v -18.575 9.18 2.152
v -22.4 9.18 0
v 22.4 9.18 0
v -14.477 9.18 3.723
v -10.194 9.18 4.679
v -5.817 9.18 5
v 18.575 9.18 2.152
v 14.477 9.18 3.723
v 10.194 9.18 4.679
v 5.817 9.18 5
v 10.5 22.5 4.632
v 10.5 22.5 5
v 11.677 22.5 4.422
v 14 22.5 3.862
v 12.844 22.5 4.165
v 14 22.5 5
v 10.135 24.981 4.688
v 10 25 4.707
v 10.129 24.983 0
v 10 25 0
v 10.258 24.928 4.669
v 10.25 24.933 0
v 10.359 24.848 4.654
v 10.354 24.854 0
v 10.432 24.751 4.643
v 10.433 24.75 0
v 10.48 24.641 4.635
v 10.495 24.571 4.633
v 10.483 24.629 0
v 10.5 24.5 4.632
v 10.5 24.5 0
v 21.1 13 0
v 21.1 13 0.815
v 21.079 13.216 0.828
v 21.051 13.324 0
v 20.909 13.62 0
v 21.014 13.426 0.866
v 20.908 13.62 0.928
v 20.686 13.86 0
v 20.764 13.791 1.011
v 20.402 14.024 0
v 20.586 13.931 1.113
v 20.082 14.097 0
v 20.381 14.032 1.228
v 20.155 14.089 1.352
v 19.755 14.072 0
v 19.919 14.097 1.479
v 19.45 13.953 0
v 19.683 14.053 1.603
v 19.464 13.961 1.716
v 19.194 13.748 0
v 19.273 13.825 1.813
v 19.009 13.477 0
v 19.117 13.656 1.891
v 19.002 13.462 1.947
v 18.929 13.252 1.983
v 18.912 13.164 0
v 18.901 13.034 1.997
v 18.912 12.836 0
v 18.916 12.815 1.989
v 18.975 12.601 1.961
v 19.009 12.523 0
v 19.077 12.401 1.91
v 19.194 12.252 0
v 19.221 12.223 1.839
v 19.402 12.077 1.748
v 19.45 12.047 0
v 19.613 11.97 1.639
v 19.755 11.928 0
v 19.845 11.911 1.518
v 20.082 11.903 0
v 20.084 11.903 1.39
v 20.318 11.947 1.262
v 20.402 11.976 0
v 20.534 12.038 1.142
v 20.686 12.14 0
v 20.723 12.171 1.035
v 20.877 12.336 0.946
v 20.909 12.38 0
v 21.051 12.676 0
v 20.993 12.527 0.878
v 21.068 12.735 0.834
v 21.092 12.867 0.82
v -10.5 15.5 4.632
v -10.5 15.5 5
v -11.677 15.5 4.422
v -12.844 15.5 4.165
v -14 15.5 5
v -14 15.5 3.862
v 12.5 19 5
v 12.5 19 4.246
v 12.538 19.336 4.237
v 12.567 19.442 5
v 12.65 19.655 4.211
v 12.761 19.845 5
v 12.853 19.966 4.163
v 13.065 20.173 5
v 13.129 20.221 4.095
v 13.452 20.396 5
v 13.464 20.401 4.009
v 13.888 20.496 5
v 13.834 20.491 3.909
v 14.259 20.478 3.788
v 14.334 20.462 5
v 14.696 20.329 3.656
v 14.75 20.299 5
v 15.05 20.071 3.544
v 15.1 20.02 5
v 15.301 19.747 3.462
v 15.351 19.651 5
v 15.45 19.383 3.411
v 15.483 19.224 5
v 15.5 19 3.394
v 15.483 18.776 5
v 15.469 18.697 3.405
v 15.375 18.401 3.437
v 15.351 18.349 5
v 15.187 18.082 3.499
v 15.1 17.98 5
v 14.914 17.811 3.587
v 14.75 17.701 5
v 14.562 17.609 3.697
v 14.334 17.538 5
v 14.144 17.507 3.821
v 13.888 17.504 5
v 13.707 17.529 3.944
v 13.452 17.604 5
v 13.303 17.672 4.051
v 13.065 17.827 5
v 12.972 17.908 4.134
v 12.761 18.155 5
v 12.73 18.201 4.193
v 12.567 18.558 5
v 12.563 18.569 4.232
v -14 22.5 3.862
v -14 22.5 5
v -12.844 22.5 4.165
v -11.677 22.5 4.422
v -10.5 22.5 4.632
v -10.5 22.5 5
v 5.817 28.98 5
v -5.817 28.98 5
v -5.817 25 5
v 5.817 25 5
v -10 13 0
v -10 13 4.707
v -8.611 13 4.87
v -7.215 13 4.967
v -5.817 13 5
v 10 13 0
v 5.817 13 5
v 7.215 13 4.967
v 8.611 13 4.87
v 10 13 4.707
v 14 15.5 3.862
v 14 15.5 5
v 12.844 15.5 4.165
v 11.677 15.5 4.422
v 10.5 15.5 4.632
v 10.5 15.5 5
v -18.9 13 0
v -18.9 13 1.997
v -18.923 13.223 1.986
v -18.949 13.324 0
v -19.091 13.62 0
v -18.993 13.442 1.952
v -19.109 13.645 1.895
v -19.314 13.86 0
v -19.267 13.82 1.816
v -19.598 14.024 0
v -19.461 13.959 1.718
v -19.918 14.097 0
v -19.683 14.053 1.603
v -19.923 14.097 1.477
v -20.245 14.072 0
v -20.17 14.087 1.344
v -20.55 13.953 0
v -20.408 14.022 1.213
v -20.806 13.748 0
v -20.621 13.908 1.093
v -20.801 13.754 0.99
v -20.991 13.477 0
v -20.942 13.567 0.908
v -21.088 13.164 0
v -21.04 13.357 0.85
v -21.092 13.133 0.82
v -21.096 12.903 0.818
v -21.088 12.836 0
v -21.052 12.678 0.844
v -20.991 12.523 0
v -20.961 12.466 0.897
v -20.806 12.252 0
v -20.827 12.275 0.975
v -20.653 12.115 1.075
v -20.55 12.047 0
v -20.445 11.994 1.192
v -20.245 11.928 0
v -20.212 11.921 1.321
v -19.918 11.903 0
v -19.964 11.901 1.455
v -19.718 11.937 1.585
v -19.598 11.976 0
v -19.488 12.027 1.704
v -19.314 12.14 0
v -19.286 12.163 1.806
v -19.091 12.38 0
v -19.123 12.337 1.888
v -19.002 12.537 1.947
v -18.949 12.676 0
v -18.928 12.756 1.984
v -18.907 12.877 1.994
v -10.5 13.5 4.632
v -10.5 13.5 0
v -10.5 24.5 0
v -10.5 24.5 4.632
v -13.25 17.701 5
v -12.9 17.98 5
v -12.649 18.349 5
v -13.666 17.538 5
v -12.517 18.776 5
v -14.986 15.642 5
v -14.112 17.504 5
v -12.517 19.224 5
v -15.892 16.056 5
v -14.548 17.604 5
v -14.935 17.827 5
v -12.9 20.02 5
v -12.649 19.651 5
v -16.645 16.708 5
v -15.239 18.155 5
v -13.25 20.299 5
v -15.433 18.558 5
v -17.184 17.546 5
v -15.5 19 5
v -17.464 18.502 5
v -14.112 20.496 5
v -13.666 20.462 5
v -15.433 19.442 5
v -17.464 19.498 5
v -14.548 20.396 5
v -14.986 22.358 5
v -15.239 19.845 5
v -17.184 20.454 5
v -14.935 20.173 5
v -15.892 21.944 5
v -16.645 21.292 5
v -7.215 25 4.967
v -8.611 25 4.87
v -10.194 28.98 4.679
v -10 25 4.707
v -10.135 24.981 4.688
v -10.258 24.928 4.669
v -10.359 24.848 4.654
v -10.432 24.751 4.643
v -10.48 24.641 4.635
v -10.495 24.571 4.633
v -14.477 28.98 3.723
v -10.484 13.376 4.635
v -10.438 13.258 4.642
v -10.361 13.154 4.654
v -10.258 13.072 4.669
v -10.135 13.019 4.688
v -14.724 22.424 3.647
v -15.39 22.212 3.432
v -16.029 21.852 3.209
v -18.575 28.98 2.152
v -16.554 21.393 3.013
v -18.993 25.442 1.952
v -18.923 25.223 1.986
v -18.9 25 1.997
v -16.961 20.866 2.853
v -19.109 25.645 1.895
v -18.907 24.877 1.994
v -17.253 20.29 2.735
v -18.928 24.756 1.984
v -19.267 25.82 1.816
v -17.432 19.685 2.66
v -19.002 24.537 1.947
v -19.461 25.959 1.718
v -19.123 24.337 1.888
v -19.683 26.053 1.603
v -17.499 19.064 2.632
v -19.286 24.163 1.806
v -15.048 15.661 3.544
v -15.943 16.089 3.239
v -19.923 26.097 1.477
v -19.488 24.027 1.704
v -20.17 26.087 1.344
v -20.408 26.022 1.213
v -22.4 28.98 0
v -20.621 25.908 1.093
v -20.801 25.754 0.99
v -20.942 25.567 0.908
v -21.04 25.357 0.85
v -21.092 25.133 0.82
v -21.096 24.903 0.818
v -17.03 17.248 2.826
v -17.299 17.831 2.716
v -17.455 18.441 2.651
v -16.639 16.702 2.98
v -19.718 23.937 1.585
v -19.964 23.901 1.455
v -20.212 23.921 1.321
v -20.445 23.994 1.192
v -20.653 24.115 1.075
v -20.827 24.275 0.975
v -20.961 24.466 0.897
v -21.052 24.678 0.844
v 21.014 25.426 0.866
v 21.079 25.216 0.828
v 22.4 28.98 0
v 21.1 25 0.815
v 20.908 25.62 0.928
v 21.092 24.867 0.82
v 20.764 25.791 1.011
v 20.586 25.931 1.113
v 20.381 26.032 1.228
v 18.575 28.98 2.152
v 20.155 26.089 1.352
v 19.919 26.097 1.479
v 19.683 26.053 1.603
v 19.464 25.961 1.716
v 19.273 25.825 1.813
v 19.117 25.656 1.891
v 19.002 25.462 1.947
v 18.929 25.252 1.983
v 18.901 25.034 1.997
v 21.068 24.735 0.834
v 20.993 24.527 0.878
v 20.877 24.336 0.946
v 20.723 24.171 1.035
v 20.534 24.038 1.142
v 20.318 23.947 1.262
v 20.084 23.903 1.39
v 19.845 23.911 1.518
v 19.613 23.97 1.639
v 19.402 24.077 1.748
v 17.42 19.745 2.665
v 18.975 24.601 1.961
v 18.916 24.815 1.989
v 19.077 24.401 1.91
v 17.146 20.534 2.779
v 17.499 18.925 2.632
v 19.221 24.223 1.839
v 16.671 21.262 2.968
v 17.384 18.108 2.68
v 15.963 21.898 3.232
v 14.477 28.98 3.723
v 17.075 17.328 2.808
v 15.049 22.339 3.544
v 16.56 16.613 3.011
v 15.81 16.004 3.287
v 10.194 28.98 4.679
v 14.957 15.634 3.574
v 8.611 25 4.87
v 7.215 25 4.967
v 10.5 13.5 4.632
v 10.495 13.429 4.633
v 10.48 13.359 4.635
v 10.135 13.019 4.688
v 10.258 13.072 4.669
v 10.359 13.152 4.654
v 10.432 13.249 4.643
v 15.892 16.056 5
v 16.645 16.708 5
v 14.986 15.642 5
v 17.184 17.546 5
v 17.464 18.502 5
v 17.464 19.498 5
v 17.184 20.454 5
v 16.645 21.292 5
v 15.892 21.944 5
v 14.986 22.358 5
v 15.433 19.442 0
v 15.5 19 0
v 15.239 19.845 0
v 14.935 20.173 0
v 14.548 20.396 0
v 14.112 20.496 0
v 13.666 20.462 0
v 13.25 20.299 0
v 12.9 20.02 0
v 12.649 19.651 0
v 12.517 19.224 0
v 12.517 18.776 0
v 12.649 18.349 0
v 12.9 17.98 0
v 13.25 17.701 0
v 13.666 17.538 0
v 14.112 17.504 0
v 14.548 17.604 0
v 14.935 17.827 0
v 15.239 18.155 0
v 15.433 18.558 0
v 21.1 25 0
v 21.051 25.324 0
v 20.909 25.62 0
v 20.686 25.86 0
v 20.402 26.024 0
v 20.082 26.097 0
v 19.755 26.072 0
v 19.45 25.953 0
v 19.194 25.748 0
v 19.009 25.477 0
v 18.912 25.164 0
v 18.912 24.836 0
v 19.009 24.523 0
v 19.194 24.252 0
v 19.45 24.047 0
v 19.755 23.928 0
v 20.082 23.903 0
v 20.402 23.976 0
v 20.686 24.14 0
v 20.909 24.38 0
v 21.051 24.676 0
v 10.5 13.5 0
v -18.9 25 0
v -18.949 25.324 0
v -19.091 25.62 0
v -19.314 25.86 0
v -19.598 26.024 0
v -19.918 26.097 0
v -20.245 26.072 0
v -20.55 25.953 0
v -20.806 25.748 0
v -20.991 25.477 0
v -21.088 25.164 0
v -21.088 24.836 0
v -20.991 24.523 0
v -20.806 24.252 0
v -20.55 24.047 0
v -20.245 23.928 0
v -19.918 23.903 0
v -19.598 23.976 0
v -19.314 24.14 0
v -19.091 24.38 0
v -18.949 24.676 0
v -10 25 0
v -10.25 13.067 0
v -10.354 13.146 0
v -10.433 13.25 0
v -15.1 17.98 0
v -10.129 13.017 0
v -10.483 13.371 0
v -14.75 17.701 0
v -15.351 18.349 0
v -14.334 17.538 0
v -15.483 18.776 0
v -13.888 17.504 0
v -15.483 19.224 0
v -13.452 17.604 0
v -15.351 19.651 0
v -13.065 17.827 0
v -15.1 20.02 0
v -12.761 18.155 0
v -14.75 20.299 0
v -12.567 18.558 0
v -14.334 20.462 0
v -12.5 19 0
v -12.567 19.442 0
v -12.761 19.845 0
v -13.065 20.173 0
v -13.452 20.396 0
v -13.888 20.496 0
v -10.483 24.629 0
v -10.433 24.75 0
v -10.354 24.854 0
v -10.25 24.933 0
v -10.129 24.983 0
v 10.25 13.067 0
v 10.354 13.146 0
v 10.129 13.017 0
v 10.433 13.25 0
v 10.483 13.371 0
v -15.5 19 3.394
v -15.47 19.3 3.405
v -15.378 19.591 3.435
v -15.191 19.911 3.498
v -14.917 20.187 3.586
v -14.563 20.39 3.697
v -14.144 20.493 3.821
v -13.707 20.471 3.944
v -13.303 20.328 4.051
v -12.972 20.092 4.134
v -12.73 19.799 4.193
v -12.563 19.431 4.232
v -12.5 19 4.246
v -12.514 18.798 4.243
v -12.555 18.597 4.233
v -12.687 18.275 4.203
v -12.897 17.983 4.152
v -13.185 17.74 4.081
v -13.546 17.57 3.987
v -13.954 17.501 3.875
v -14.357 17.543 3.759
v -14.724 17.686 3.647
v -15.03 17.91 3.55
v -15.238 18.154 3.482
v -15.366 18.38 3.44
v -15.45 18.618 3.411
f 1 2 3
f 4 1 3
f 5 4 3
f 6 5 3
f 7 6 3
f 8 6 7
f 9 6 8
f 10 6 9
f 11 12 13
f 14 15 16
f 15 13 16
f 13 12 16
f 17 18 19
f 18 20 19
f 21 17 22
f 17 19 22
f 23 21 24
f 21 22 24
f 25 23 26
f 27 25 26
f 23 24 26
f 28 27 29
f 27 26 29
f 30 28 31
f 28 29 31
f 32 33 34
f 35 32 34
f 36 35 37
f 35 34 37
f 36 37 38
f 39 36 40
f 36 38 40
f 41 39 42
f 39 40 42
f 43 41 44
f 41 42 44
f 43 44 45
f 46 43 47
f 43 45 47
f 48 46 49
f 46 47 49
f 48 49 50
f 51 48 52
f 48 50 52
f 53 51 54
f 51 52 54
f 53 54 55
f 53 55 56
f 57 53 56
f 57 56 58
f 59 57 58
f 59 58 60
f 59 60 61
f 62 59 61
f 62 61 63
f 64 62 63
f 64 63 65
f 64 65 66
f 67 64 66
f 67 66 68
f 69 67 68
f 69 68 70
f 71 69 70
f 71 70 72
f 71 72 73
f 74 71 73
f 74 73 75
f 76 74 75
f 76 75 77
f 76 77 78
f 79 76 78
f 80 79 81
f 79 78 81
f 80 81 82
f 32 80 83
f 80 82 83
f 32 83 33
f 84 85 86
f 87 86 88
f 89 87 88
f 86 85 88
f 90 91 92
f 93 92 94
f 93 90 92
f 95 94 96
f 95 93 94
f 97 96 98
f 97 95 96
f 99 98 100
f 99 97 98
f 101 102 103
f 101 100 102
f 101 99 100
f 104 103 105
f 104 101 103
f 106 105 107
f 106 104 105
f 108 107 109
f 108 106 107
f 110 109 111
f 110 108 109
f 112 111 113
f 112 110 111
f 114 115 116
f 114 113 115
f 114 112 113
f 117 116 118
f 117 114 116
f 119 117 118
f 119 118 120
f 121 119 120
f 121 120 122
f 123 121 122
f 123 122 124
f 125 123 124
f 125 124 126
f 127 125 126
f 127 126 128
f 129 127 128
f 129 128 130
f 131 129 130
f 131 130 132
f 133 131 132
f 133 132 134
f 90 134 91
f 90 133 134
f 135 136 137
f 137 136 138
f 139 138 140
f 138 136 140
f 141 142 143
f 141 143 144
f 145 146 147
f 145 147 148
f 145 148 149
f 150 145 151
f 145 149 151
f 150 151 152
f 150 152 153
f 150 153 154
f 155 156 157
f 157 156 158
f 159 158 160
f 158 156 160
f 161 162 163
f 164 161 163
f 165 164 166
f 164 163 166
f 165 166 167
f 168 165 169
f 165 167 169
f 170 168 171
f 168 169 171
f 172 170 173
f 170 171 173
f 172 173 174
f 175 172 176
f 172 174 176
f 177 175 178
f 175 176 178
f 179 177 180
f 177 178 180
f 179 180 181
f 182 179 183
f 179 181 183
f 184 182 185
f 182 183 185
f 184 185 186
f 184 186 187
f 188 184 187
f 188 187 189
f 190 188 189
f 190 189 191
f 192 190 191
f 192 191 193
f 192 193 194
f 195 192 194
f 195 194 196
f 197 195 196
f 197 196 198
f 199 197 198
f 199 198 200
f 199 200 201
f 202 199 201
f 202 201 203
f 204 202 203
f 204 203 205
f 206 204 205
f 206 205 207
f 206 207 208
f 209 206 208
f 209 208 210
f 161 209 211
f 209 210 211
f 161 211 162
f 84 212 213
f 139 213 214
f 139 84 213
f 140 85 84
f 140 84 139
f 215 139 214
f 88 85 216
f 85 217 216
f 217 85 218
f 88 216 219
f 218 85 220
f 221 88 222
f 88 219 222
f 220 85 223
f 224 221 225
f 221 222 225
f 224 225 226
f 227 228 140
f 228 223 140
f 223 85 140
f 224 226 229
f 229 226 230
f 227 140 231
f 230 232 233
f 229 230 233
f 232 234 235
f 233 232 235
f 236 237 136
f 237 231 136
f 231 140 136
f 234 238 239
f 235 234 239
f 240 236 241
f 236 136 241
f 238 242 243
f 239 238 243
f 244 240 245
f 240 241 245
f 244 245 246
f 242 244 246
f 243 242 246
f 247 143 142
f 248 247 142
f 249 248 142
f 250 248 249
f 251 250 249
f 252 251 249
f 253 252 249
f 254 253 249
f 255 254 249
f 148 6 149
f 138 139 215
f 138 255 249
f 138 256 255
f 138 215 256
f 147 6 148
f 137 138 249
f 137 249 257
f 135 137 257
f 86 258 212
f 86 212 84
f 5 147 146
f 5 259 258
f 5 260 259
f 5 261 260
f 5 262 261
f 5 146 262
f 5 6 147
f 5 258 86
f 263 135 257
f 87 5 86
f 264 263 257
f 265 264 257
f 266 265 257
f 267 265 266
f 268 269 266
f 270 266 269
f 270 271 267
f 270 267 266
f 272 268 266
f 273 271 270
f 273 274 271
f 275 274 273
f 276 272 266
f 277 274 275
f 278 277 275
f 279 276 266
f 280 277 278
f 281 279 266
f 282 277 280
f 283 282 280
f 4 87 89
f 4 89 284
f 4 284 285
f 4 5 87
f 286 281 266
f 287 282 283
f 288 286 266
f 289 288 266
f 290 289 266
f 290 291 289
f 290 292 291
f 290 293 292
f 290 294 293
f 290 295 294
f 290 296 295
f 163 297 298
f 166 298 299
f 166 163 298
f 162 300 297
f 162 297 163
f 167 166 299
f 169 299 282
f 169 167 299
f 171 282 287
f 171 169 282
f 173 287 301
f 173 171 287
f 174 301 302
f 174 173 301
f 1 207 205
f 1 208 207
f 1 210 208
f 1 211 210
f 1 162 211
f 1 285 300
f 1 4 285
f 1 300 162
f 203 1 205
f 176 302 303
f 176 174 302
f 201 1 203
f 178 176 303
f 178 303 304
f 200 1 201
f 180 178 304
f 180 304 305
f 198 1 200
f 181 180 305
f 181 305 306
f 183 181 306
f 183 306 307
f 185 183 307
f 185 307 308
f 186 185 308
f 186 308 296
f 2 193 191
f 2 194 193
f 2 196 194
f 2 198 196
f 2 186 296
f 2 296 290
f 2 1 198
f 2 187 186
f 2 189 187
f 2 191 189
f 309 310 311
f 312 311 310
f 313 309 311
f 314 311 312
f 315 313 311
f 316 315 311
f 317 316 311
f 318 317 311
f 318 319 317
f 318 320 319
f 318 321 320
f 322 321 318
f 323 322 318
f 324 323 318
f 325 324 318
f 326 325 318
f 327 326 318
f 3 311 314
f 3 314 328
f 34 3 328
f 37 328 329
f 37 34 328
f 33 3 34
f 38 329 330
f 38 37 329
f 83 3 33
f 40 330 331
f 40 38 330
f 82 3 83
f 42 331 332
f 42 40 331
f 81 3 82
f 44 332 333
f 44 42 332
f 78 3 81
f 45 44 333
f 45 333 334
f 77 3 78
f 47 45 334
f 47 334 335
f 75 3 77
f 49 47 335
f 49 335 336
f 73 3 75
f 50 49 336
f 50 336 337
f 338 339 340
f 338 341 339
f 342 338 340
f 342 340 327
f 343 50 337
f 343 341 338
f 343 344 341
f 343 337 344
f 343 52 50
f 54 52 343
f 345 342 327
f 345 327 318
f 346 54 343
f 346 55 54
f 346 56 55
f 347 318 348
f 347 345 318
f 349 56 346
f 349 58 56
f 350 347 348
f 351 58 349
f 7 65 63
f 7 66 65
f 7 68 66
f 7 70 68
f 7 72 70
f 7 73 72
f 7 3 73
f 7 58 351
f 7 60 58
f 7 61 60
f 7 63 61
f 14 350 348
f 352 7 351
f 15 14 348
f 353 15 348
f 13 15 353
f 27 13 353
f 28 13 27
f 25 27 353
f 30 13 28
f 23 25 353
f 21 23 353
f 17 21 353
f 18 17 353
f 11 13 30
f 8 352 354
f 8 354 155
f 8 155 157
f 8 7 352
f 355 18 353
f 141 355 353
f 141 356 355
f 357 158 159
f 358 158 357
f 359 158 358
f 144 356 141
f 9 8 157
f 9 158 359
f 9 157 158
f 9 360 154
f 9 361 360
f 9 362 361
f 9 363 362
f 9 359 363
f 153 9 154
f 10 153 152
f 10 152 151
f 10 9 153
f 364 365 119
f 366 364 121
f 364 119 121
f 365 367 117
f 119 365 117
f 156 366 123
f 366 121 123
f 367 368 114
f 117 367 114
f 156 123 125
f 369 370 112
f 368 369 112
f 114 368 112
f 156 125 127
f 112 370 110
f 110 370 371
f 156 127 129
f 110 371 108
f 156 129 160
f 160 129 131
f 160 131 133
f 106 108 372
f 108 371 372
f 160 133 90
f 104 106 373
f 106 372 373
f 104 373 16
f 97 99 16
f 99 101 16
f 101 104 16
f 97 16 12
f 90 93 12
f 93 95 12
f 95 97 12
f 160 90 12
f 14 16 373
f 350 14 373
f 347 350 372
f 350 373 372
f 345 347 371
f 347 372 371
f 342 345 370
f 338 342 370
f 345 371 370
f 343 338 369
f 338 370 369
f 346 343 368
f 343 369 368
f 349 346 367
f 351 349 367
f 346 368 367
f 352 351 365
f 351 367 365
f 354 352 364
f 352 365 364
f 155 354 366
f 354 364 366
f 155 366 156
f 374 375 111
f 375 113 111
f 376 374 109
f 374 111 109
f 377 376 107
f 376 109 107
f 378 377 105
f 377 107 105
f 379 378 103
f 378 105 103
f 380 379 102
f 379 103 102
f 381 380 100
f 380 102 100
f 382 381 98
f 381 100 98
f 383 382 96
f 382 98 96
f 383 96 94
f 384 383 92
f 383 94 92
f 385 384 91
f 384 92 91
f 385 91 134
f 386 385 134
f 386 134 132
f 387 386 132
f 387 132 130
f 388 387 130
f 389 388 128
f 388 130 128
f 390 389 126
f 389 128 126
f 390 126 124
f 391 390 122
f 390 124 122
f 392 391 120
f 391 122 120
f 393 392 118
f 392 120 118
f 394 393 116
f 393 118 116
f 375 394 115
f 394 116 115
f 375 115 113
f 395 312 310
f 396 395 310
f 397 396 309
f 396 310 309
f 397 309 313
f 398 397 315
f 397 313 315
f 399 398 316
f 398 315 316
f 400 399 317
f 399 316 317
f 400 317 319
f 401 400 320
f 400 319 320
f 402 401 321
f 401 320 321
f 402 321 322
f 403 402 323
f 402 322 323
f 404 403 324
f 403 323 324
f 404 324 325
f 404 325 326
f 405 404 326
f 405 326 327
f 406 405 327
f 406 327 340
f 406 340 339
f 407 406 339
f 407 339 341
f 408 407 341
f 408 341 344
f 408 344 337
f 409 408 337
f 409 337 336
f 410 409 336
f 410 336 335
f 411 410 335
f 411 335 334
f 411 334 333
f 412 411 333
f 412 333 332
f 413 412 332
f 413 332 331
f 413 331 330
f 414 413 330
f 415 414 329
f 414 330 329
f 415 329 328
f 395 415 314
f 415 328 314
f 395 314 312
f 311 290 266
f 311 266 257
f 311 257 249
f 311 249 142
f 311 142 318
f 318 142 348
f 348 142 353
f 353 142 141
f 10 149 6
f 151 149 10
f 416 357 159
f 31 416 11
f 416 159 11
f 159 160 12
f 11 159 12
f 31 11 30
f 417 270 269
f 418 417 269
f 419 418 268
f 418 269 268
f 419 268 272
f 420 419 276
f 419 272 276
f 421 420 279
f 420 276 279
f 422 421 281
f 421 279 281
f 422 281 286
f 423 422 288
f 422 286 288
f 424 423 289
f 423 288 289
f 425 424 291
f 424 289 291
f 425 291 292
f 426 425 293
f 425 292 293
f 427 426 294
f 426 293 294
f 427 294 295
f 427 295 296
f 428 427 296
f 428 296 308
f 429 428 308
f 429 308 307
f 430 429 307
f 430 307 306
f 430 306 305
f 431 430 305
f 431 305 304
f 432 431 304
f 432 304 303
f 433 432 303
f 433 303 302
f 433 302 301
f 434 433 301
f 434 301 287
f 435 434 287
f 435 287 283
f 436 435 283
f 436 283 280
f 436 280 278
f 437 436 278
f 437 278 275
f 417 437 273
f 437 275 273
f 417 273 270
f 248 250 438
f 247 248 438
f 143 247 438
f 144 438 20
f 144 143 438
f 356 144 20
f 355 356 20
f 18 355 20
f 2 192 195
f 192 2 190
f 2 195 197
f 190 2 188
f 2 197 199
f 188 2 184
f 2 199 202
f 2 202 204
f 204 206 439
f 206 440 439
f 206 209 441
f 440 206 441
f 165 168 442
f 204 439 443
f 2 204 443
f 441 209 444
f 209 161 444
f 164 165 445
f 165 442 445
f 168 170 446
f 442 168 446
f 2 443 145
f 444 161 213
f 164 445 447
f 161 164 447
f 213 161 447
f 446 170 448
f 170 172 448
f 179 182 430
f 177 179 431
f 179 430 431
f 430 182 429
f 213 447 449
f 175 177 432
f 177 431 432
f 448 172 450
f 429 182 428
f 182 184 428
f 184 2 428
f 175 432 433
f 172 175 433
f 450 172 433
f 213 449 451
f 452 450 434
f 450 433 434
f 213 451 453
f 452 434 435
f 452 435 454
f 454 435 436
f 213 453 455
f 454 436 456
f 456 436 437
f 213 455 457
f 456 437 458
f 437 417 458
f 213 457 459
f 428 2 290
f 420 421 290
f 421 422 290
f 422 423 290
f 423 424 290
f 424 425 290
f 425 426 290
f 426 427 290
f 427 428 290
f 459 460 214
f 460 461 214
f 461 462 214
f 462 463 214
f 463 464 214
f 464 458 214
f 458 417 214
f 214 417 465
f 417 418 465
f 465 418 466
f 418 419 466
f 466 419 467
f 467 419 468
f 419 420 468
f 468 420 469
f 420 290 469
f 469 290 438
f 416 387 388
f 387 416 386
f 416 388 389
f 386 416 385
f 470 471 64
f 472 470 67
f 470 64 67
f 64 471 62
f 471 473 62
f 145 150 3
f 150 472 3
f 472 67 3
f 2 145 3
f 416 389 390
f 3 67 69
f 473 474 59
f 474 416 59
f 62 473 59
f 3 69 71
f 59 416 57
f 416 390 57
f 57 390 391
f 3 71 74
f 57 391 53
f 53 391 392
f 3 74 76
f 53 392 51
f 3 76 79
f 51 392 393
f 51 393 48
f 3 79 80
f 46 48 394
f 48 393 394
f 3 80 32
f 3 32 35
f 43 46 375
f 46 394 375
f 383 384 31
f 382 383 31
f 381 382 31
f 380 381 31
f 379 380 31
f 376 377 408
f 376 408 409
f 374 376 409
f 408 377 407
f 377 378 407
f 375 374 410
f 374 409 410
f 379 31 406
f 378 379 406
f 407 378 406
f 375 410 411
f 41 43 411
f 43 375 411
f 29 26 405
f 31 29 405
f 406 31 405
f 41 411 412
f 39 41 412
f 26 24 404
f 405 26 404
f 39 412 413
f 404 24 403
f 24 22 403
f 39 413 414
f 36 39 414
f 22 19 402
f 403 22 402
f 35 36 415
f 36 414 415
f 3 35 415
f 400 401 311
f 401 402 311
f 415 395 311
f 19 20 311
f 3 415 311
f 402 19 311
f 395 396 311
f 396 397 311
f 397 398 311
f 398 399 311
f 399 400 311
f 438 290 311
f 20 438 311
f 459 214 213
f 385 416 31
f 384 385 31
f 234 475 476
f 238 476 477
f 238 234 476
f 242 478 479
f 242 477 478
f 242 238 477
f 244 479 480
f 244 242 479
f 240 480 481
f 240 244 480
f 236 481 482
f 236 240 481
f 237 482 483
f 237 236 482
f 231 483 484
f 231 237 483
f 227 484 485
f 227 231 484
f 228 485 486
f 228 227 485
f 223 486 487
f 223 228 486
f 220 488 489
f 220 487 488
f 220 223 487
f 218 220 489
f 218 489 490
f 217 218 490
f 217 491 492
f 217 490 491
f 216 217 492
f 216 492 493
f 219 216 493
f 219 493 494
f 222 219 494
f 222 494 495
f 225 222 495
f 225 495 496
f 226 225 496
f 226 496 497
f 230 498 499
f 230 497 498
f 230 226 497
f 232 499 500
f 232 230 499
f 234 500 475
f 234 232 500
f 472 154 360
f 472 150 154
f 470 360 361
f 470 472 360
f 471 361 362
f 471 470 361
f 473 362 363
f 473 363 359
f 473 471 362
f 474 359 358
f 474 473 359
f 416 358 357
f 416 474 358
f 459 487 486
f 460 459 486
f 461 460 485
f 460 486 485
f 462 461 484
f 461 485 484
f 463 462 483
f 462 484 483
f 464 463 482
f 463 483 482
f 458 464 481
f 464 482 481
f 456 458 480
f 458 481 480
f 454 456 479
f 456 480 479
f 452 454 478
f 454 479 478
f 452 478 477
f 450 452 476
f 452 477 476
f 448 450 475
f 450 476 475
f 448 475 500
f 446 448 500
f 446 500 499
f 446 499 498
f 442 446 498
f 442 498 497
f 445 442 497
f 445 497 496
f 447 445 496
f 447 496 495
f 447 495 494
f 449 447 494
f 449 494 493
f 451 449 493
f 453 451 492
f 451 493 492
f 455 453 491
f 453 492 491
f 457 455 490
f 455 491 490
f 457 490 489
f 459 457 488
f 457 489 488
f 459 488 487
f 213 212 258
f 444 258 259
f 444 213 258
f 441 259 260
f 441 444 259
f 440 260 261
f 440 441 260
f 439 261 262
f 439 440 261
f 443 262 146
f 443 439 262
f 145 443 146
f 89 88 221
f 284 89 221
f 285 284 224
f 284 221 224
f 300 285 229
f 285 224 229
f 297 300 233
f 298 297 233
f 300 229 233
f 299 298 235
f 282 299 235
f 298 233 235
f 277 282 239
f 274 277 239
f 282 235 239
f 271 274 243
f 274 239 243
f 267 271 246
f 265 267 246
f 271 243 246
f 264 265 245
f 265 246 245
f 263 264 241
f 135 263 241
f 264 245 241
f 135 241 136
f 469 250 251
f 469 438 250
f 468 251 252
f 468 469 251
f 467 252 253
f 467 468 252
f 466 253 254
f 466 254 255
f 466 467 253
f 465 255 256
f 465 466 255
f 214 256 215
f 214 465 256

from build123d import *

# Parameters (mm, degrees)
SKETCH1_W           = 44.8
SKETCH1_H           = 19.8
BOSS_EXTRUDE1_DEPTH = 5
SKETCH2_R           = 1.1
CUT_EXTRUDE1_DEPTH  = 13
SKETCH3_R           = 1.5
CUT_EXTRUDE2_DEPTH  = 10
SKETCH4_W           = 21
SKETCH4_H           = 12
CUT_EXTRUDE3_DEPTH  = 10
FILLET1_START       = 9.18
FILLET1_DEPTH       = 19.8
BOSS_EXTRUDE2_START = -5
SKETCH5_R           = 3.5
SKETCH5_R_2         = 1.5
BOSS_EXTRUDE2_DEPTH = 5
FILLET2_R           = 0.5


with BuildPart() as part:
    # Sketch1 → Boss-Extrude1 (new body)
    with BuildSketch(Plane.XY):
        with Locations((0, 19.08)):
            Rectangle(SKETCH1_W, SKETCH1_H)
    extrude(amount=BOSS_EXTRUDE1_DEPTH)

    # Sketch2 → Cut-Extrude1 (cut)
    with BuildSketch(Plane.XY.offset(5)):
        with Locations((-20, 25)):
            Circle(SKETCH2_R)
        with Locations((-20, 13)):
            Circle(SKETCH2_R)
        with Locations((20, 25)):
            Circle(SKETCH2_R)
        with Locations((20, 13)):
            Circle(SKETCH2_R)
    extrude(amount=-CUT_EXTRUDE1_DEPTH, mode=Mode.SUBTRACT)

    # Sketch3 → Cut-Extrude2 (cut)
    with BuildSketch(Plane.XY.offset(5)):
        with Locations((-14, 19)):
            Circle(SKETCH3_R)
        with Locations((14, 19)):
            Circle(SKETCH3_R)
    extrude(amount=-CUT_EXTRUDE2_DEPTH, mode=Mode.SUBTRACT)

    # Sketch4 → Cut-Extrude3 (cut)
    with BuildSketch(Plane.XY.offset(5)):
        with Locations((0, 19)):
            Rectangle(SKETCH4_W, SKETCH4_H)
    extrude(amount=-CUT_EXTRUDE3_DEPTH, mode=Mode.SUBTRACT)

    # Fillet1: read off the stored shape, not the designer's step
    # Fillet1 outline → Fillet1 (cut)
    with BuildSketch(Plane(origin=(0, 0, 0), x_dir=(1, 0, 0), z_dir=(0, 1, 0)).offset(FILLET1_START)):
        with BuildLine():
            Line((22.4, -5), (22.4, 0))
            ThreePointArc((22.4, 0), (14.477130086, -3.722813233), (5.816876048, -5))
            Line((5.816876048, -5), (22.4, -5))
        make_face()
        with BuildLine():
            Line((-22.4, -5), (-5.816876048, -5))
            ThreePointArc((-5.816876048, -5), (-14.477130086, -3.722813233), (-22.4, 0))
            Line((-22.4, 0), (-22.4, -5))
        make_face()
    extrude(amount=FILLET1_DEPTH, mode=Mode.SUBTRACT)

    # Sketch5 → Boss-Extrude2 (add)
    # profile 1 of 6: a face of its own
    with BuildSketch(Plane(origin=(0, 0, 0), x_dir=(-1, 0, 0), z_dir=(0, 0, -1)).offset(BOSS_EXTRUDE2_START)):
        with Locations((-14, 19)):
            Circle(SKETCH5_R)
        with Locations((-14, 19)):
            Circle(SKETCH5_R_2, mode=Mode.SUBTRACT)
    # profile 2 of 6: a face of its own
    with BuildSketch(Plane(origin=(0, 0, 0), x_dir=(-1, 0, 0), z_dir=(0, 0, -1)).offset(BOSS_EXTRUDE2_START)):
        with BuildLine():
            Line((-10.5, 22.5), (-14, 22.5))
            ThreePointArc((-14, 22.5), (-11.525126266, 21.474873734), (-10.5, 19))
            Line((-10.5, 19), (-10.5, 22.5))
        make_face()
    # profile 3 of 6: a face of its own
    with BuildSketch(Plane(origin=(0, 0, 0), x_dir=(-1, 0, 0), z_dir=(0, 0, -1)).offset(BOSS_EXTRUDE2_START)):
        with BuildLine():
            Line((-10.5, 15.5), (-10.5, 19))
            ThreePointArc((-10.5, 19), (-11.525126266, 16.525126266), (-14, 15.5))
            Line((-14, 15.5), (-10.5, 15.5))
        make_face()
    # profile 4 of 6: a face of its own
    with BuildSketch(Plane(origin=(0, 0, 0), x_dir=(-1, 0, 0), z_dir=(0, 0, -1)).offset(BOSS_EXTRUDE2_START)):
        with Locations((14, 19)):
            Circle(SKETCH5_R)
        with Locations((14, 19)):
            Circle(SKETCH5_R_2, mode=Mode.SUBTRACT)
    # profile 5 of 6: a face of its own
    with BuildSketch(Plane(origin=(0, 0, 0), x_dir=(-1, 0, 0), z_dir=(0, 0, -1)).offset(BOSS_EXTRUDE2_START)):
        with BuildLine():
            ThreePointArc((14, 15.5), (11.525126266, 16.525126266), (10.5, 19))
            Line((10.5, 19), (10.5, 15.5))
            Line((10.5, 15.5), (14, 15.5))
        make_face()
    # profile 6 of 6: a face of its own
    with BuildSketch(Plane(origin=(0, 0, 0), x_dir=(-1, 0, 0), z_dir=(0, 0, -1)).offset(BOSS_EXTRUDE2_START)):
        with BuildLine():
            ThreePointArc((10.5, 19), (11.525126266, 21.474873734), (14, 22.5))
            Line((14, 22.5), (10.5, 22.5))
            Line((10.5, 22.5), (10.5, 19))
        make_face()
    extrude(amount=BOSS_EXTRUDE2_DEPTH)

    # Fillet2
    fillet2_edges = [part.edges().sort_by_distance(p)[0] for p in [
        (-10.5, 13, 2.316109055),
        (-10.5, 25, 2.316109055),
        (10.5, 25, 2.316109055),
        (10.5, 13, 2.316109055),
    ]]
    fillet(fillet2_edges, radius=FILLET2_R)


solid = part.part
